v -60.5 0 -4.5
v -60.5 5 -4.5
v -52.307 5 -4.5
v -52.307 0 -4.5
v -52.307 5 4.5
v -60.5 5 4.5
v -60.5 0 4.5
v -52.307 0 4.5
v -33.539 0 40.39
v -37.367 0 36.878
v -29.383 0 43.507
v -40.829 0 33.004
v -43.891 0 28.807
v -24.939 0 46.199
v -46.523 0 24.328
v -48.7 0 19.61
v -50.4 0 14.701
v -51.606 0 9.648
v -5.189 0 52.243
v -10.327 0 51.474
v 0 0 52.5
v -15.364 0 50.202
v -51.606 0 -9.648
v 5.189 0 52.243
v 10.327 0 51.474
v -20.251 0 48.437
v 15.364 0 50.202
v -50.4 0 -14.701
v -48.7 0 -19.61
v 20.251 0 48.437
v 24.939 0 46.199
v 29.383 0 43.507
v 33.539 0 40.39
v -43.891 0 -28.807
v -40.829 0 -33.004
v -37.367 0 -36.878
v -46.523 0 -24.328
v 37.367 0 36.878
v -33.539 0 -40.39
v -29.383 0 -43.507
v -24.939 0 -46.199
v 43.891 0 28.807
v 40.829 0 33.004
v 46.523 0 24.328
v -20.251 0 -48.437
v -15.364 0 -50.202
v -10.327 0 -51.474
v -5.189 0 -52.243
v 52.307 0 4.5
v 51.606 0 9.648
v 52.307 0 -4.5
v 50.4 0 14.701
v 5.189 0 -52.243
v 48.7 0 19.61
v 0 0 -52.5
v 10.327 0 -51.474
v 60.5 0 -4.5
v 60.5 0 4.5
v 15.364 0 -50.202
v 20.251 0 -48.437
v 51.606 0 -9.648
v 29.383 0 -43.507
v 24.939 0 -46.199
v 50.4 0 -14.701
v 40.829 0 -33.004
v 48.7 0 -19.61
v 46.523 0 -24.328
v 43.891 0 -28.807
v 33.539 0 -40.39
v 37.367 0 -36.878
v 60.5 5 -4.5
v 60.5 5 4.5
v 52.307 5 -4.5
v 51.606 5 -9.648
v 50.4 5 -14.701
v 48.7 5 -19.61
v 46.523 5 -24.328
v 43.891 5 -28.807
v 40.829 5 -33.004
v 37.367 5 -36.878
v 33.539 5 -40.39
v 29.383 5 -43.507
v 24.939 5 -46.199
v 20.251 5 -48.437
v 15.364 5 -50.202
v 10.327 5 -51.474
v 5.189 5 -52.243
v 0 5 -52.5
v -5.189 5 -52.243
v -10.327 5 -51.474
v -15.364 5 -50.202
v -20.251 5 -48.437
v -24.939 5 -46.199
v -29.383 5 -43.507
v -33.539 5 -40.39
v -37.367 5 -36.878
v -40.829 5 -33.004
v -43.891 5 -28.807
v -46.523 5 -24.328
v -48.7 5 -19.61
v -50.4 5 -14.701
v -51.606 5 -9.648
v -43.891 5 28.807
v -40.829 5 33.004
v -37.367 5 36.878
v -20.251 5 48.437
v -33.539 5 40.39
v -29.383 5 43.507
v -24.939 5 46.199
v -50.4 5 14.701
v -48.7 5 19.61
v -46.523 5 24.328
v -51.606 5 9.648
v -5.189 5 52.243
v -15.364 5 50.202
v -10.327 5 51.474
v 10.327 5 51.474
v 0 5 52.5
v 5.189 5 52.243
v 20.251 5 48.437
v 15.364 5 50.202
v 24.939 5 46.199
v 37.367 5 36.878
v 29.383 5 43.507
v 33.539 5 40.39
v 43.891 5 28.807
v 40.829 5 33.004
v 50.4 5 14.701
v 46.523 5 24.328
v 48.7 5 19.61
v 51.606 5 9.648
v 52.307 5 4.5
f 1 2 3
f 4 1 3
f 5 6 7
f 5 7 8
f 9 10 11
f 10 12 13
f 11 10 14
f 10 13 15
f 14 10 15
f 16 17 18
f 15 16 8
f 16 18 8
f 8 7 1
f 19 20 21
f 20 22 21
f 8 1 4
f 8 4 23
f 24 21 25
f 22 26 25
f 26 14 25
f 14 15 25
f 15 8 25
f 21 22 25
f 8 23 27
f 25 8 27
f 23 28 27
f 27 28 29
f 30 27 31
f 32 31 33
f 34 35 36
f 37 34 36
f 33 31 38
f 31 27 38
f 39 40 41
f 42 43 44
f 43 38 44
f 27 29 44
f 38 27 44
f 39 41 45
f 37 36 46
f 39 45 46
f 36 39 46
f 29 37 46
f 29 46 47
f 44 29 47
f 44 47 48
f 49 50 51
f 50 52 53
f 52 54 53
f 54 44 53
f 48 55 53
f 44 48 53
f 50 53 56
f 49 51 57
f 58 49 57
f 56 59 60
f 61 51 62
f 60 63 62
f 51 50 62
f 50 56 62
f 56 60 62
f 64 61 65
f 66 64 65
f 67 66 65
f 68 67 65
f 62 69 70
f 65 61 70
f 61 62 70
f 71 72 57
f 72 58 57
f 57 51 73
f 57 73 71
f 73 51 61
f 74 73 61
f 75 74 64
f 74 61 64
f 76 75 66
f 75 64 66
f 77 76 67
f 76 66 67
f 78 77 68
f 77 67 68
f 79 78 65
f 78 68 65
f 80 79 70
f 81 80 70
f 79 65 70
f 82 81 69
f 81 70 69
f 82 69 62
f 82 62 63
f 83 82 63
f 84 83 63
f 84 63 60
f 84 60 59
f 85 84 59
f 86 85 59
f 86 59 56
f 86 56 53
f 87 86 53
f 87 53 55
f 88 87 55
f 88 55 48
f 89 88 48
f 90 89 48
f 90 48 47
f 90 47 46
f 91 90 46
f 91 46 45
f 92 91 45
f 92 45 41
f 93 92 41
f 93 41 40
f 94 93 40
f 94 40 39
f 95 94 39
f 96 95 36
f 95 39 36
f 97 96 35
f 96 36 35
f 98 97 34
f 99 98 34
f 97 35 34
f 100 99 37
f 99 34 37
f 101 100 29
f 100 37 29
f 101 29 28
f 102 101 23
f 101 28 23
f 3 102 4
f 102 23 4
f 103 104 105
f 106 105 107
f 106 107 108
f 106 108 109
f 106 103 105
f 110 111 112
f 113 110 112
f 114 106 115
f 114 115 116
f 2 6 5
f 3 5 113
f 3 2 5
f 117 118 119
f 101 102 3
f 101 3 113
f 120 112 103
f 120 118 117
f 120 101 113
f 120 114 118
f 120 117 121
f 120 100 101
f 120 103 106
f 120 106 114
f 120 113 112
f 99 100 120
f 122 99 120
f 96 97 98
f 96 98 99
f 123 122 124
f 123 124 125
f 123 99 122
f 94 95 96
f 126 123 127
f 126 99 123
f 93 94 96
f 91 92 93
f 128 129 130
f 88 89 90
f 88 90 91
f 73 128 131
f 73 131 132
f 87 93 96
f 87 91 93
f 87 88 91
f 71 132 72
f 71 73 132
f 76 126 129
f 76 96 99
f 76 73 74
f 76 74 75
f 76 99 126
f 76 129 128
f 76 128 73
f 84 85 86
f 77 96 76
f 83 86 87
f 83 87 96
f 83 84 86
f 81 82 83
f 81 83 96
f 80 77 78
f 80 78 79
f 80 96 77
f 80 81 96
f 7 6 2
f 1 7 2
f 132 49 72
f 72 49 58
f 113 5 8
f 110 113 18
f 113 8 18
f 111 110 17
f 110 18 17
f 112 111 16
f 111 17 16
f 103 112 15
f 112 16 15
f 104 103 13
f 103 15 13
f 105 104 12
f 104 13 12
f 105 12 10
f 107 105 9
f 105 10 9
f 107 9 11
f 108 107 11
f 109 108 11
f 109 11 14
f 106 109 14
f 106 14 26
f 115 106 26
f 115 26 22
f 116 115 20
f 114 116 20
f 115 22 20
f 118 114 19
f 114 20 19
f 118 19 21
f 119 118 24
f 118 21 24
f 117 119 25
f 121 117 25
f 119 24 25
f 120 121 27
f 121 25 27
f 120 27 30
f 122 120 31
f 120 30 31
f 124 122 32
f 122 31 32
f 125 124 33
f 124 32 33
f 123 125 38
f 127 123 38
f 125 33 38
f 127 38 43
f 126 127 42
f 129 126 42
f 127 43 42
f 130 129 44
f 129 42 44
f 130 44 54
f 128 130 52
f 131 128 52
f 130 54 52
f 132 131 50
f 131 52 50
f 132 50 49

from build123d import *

# Parameters (mm, degrees)
SKETCH3_R           = 52.5
BOSS_EXTRUDE1_DEPTH = 5
SKETCH5_W           = 16
SKETCH5_H           = 9
BOSS_EXTRUDE2_DEPTH = 2.5


with BuildPart() as part:
    # Sketch3 → Boss-Extrude1 (new body)
    with BuildSketch(Plane(origin=(0, 0, 0), x_dir=(1, 0, 0), z_dir=(0, 1, 0))):
        with Locations(Location((0, 0, 0), (0, 0, 270))):
            Circle(SKETCH3_R)
    extrude(amount=BOSS_EXTRUDE1_DEPTH)

    # Sketch5 → Boss-Extrude2 (add, symmetric)
    with BuildSketch(Plane(origin=(0, 2.5, 0), x_dir=(1, 0, 0), z_dir=(0, 1, 0))):
        with Locations((52.5, 0)):
            Rectangle(SKETCH5_W, SKETCH5_H)
        with Locations((-52.5, 0)):
            Rectangle(SKETCH5_W, SKETCH5_H)
    extrude(amount=BOSS_EXTRUDE2_DEPTH, both=True)


solid = part.part
